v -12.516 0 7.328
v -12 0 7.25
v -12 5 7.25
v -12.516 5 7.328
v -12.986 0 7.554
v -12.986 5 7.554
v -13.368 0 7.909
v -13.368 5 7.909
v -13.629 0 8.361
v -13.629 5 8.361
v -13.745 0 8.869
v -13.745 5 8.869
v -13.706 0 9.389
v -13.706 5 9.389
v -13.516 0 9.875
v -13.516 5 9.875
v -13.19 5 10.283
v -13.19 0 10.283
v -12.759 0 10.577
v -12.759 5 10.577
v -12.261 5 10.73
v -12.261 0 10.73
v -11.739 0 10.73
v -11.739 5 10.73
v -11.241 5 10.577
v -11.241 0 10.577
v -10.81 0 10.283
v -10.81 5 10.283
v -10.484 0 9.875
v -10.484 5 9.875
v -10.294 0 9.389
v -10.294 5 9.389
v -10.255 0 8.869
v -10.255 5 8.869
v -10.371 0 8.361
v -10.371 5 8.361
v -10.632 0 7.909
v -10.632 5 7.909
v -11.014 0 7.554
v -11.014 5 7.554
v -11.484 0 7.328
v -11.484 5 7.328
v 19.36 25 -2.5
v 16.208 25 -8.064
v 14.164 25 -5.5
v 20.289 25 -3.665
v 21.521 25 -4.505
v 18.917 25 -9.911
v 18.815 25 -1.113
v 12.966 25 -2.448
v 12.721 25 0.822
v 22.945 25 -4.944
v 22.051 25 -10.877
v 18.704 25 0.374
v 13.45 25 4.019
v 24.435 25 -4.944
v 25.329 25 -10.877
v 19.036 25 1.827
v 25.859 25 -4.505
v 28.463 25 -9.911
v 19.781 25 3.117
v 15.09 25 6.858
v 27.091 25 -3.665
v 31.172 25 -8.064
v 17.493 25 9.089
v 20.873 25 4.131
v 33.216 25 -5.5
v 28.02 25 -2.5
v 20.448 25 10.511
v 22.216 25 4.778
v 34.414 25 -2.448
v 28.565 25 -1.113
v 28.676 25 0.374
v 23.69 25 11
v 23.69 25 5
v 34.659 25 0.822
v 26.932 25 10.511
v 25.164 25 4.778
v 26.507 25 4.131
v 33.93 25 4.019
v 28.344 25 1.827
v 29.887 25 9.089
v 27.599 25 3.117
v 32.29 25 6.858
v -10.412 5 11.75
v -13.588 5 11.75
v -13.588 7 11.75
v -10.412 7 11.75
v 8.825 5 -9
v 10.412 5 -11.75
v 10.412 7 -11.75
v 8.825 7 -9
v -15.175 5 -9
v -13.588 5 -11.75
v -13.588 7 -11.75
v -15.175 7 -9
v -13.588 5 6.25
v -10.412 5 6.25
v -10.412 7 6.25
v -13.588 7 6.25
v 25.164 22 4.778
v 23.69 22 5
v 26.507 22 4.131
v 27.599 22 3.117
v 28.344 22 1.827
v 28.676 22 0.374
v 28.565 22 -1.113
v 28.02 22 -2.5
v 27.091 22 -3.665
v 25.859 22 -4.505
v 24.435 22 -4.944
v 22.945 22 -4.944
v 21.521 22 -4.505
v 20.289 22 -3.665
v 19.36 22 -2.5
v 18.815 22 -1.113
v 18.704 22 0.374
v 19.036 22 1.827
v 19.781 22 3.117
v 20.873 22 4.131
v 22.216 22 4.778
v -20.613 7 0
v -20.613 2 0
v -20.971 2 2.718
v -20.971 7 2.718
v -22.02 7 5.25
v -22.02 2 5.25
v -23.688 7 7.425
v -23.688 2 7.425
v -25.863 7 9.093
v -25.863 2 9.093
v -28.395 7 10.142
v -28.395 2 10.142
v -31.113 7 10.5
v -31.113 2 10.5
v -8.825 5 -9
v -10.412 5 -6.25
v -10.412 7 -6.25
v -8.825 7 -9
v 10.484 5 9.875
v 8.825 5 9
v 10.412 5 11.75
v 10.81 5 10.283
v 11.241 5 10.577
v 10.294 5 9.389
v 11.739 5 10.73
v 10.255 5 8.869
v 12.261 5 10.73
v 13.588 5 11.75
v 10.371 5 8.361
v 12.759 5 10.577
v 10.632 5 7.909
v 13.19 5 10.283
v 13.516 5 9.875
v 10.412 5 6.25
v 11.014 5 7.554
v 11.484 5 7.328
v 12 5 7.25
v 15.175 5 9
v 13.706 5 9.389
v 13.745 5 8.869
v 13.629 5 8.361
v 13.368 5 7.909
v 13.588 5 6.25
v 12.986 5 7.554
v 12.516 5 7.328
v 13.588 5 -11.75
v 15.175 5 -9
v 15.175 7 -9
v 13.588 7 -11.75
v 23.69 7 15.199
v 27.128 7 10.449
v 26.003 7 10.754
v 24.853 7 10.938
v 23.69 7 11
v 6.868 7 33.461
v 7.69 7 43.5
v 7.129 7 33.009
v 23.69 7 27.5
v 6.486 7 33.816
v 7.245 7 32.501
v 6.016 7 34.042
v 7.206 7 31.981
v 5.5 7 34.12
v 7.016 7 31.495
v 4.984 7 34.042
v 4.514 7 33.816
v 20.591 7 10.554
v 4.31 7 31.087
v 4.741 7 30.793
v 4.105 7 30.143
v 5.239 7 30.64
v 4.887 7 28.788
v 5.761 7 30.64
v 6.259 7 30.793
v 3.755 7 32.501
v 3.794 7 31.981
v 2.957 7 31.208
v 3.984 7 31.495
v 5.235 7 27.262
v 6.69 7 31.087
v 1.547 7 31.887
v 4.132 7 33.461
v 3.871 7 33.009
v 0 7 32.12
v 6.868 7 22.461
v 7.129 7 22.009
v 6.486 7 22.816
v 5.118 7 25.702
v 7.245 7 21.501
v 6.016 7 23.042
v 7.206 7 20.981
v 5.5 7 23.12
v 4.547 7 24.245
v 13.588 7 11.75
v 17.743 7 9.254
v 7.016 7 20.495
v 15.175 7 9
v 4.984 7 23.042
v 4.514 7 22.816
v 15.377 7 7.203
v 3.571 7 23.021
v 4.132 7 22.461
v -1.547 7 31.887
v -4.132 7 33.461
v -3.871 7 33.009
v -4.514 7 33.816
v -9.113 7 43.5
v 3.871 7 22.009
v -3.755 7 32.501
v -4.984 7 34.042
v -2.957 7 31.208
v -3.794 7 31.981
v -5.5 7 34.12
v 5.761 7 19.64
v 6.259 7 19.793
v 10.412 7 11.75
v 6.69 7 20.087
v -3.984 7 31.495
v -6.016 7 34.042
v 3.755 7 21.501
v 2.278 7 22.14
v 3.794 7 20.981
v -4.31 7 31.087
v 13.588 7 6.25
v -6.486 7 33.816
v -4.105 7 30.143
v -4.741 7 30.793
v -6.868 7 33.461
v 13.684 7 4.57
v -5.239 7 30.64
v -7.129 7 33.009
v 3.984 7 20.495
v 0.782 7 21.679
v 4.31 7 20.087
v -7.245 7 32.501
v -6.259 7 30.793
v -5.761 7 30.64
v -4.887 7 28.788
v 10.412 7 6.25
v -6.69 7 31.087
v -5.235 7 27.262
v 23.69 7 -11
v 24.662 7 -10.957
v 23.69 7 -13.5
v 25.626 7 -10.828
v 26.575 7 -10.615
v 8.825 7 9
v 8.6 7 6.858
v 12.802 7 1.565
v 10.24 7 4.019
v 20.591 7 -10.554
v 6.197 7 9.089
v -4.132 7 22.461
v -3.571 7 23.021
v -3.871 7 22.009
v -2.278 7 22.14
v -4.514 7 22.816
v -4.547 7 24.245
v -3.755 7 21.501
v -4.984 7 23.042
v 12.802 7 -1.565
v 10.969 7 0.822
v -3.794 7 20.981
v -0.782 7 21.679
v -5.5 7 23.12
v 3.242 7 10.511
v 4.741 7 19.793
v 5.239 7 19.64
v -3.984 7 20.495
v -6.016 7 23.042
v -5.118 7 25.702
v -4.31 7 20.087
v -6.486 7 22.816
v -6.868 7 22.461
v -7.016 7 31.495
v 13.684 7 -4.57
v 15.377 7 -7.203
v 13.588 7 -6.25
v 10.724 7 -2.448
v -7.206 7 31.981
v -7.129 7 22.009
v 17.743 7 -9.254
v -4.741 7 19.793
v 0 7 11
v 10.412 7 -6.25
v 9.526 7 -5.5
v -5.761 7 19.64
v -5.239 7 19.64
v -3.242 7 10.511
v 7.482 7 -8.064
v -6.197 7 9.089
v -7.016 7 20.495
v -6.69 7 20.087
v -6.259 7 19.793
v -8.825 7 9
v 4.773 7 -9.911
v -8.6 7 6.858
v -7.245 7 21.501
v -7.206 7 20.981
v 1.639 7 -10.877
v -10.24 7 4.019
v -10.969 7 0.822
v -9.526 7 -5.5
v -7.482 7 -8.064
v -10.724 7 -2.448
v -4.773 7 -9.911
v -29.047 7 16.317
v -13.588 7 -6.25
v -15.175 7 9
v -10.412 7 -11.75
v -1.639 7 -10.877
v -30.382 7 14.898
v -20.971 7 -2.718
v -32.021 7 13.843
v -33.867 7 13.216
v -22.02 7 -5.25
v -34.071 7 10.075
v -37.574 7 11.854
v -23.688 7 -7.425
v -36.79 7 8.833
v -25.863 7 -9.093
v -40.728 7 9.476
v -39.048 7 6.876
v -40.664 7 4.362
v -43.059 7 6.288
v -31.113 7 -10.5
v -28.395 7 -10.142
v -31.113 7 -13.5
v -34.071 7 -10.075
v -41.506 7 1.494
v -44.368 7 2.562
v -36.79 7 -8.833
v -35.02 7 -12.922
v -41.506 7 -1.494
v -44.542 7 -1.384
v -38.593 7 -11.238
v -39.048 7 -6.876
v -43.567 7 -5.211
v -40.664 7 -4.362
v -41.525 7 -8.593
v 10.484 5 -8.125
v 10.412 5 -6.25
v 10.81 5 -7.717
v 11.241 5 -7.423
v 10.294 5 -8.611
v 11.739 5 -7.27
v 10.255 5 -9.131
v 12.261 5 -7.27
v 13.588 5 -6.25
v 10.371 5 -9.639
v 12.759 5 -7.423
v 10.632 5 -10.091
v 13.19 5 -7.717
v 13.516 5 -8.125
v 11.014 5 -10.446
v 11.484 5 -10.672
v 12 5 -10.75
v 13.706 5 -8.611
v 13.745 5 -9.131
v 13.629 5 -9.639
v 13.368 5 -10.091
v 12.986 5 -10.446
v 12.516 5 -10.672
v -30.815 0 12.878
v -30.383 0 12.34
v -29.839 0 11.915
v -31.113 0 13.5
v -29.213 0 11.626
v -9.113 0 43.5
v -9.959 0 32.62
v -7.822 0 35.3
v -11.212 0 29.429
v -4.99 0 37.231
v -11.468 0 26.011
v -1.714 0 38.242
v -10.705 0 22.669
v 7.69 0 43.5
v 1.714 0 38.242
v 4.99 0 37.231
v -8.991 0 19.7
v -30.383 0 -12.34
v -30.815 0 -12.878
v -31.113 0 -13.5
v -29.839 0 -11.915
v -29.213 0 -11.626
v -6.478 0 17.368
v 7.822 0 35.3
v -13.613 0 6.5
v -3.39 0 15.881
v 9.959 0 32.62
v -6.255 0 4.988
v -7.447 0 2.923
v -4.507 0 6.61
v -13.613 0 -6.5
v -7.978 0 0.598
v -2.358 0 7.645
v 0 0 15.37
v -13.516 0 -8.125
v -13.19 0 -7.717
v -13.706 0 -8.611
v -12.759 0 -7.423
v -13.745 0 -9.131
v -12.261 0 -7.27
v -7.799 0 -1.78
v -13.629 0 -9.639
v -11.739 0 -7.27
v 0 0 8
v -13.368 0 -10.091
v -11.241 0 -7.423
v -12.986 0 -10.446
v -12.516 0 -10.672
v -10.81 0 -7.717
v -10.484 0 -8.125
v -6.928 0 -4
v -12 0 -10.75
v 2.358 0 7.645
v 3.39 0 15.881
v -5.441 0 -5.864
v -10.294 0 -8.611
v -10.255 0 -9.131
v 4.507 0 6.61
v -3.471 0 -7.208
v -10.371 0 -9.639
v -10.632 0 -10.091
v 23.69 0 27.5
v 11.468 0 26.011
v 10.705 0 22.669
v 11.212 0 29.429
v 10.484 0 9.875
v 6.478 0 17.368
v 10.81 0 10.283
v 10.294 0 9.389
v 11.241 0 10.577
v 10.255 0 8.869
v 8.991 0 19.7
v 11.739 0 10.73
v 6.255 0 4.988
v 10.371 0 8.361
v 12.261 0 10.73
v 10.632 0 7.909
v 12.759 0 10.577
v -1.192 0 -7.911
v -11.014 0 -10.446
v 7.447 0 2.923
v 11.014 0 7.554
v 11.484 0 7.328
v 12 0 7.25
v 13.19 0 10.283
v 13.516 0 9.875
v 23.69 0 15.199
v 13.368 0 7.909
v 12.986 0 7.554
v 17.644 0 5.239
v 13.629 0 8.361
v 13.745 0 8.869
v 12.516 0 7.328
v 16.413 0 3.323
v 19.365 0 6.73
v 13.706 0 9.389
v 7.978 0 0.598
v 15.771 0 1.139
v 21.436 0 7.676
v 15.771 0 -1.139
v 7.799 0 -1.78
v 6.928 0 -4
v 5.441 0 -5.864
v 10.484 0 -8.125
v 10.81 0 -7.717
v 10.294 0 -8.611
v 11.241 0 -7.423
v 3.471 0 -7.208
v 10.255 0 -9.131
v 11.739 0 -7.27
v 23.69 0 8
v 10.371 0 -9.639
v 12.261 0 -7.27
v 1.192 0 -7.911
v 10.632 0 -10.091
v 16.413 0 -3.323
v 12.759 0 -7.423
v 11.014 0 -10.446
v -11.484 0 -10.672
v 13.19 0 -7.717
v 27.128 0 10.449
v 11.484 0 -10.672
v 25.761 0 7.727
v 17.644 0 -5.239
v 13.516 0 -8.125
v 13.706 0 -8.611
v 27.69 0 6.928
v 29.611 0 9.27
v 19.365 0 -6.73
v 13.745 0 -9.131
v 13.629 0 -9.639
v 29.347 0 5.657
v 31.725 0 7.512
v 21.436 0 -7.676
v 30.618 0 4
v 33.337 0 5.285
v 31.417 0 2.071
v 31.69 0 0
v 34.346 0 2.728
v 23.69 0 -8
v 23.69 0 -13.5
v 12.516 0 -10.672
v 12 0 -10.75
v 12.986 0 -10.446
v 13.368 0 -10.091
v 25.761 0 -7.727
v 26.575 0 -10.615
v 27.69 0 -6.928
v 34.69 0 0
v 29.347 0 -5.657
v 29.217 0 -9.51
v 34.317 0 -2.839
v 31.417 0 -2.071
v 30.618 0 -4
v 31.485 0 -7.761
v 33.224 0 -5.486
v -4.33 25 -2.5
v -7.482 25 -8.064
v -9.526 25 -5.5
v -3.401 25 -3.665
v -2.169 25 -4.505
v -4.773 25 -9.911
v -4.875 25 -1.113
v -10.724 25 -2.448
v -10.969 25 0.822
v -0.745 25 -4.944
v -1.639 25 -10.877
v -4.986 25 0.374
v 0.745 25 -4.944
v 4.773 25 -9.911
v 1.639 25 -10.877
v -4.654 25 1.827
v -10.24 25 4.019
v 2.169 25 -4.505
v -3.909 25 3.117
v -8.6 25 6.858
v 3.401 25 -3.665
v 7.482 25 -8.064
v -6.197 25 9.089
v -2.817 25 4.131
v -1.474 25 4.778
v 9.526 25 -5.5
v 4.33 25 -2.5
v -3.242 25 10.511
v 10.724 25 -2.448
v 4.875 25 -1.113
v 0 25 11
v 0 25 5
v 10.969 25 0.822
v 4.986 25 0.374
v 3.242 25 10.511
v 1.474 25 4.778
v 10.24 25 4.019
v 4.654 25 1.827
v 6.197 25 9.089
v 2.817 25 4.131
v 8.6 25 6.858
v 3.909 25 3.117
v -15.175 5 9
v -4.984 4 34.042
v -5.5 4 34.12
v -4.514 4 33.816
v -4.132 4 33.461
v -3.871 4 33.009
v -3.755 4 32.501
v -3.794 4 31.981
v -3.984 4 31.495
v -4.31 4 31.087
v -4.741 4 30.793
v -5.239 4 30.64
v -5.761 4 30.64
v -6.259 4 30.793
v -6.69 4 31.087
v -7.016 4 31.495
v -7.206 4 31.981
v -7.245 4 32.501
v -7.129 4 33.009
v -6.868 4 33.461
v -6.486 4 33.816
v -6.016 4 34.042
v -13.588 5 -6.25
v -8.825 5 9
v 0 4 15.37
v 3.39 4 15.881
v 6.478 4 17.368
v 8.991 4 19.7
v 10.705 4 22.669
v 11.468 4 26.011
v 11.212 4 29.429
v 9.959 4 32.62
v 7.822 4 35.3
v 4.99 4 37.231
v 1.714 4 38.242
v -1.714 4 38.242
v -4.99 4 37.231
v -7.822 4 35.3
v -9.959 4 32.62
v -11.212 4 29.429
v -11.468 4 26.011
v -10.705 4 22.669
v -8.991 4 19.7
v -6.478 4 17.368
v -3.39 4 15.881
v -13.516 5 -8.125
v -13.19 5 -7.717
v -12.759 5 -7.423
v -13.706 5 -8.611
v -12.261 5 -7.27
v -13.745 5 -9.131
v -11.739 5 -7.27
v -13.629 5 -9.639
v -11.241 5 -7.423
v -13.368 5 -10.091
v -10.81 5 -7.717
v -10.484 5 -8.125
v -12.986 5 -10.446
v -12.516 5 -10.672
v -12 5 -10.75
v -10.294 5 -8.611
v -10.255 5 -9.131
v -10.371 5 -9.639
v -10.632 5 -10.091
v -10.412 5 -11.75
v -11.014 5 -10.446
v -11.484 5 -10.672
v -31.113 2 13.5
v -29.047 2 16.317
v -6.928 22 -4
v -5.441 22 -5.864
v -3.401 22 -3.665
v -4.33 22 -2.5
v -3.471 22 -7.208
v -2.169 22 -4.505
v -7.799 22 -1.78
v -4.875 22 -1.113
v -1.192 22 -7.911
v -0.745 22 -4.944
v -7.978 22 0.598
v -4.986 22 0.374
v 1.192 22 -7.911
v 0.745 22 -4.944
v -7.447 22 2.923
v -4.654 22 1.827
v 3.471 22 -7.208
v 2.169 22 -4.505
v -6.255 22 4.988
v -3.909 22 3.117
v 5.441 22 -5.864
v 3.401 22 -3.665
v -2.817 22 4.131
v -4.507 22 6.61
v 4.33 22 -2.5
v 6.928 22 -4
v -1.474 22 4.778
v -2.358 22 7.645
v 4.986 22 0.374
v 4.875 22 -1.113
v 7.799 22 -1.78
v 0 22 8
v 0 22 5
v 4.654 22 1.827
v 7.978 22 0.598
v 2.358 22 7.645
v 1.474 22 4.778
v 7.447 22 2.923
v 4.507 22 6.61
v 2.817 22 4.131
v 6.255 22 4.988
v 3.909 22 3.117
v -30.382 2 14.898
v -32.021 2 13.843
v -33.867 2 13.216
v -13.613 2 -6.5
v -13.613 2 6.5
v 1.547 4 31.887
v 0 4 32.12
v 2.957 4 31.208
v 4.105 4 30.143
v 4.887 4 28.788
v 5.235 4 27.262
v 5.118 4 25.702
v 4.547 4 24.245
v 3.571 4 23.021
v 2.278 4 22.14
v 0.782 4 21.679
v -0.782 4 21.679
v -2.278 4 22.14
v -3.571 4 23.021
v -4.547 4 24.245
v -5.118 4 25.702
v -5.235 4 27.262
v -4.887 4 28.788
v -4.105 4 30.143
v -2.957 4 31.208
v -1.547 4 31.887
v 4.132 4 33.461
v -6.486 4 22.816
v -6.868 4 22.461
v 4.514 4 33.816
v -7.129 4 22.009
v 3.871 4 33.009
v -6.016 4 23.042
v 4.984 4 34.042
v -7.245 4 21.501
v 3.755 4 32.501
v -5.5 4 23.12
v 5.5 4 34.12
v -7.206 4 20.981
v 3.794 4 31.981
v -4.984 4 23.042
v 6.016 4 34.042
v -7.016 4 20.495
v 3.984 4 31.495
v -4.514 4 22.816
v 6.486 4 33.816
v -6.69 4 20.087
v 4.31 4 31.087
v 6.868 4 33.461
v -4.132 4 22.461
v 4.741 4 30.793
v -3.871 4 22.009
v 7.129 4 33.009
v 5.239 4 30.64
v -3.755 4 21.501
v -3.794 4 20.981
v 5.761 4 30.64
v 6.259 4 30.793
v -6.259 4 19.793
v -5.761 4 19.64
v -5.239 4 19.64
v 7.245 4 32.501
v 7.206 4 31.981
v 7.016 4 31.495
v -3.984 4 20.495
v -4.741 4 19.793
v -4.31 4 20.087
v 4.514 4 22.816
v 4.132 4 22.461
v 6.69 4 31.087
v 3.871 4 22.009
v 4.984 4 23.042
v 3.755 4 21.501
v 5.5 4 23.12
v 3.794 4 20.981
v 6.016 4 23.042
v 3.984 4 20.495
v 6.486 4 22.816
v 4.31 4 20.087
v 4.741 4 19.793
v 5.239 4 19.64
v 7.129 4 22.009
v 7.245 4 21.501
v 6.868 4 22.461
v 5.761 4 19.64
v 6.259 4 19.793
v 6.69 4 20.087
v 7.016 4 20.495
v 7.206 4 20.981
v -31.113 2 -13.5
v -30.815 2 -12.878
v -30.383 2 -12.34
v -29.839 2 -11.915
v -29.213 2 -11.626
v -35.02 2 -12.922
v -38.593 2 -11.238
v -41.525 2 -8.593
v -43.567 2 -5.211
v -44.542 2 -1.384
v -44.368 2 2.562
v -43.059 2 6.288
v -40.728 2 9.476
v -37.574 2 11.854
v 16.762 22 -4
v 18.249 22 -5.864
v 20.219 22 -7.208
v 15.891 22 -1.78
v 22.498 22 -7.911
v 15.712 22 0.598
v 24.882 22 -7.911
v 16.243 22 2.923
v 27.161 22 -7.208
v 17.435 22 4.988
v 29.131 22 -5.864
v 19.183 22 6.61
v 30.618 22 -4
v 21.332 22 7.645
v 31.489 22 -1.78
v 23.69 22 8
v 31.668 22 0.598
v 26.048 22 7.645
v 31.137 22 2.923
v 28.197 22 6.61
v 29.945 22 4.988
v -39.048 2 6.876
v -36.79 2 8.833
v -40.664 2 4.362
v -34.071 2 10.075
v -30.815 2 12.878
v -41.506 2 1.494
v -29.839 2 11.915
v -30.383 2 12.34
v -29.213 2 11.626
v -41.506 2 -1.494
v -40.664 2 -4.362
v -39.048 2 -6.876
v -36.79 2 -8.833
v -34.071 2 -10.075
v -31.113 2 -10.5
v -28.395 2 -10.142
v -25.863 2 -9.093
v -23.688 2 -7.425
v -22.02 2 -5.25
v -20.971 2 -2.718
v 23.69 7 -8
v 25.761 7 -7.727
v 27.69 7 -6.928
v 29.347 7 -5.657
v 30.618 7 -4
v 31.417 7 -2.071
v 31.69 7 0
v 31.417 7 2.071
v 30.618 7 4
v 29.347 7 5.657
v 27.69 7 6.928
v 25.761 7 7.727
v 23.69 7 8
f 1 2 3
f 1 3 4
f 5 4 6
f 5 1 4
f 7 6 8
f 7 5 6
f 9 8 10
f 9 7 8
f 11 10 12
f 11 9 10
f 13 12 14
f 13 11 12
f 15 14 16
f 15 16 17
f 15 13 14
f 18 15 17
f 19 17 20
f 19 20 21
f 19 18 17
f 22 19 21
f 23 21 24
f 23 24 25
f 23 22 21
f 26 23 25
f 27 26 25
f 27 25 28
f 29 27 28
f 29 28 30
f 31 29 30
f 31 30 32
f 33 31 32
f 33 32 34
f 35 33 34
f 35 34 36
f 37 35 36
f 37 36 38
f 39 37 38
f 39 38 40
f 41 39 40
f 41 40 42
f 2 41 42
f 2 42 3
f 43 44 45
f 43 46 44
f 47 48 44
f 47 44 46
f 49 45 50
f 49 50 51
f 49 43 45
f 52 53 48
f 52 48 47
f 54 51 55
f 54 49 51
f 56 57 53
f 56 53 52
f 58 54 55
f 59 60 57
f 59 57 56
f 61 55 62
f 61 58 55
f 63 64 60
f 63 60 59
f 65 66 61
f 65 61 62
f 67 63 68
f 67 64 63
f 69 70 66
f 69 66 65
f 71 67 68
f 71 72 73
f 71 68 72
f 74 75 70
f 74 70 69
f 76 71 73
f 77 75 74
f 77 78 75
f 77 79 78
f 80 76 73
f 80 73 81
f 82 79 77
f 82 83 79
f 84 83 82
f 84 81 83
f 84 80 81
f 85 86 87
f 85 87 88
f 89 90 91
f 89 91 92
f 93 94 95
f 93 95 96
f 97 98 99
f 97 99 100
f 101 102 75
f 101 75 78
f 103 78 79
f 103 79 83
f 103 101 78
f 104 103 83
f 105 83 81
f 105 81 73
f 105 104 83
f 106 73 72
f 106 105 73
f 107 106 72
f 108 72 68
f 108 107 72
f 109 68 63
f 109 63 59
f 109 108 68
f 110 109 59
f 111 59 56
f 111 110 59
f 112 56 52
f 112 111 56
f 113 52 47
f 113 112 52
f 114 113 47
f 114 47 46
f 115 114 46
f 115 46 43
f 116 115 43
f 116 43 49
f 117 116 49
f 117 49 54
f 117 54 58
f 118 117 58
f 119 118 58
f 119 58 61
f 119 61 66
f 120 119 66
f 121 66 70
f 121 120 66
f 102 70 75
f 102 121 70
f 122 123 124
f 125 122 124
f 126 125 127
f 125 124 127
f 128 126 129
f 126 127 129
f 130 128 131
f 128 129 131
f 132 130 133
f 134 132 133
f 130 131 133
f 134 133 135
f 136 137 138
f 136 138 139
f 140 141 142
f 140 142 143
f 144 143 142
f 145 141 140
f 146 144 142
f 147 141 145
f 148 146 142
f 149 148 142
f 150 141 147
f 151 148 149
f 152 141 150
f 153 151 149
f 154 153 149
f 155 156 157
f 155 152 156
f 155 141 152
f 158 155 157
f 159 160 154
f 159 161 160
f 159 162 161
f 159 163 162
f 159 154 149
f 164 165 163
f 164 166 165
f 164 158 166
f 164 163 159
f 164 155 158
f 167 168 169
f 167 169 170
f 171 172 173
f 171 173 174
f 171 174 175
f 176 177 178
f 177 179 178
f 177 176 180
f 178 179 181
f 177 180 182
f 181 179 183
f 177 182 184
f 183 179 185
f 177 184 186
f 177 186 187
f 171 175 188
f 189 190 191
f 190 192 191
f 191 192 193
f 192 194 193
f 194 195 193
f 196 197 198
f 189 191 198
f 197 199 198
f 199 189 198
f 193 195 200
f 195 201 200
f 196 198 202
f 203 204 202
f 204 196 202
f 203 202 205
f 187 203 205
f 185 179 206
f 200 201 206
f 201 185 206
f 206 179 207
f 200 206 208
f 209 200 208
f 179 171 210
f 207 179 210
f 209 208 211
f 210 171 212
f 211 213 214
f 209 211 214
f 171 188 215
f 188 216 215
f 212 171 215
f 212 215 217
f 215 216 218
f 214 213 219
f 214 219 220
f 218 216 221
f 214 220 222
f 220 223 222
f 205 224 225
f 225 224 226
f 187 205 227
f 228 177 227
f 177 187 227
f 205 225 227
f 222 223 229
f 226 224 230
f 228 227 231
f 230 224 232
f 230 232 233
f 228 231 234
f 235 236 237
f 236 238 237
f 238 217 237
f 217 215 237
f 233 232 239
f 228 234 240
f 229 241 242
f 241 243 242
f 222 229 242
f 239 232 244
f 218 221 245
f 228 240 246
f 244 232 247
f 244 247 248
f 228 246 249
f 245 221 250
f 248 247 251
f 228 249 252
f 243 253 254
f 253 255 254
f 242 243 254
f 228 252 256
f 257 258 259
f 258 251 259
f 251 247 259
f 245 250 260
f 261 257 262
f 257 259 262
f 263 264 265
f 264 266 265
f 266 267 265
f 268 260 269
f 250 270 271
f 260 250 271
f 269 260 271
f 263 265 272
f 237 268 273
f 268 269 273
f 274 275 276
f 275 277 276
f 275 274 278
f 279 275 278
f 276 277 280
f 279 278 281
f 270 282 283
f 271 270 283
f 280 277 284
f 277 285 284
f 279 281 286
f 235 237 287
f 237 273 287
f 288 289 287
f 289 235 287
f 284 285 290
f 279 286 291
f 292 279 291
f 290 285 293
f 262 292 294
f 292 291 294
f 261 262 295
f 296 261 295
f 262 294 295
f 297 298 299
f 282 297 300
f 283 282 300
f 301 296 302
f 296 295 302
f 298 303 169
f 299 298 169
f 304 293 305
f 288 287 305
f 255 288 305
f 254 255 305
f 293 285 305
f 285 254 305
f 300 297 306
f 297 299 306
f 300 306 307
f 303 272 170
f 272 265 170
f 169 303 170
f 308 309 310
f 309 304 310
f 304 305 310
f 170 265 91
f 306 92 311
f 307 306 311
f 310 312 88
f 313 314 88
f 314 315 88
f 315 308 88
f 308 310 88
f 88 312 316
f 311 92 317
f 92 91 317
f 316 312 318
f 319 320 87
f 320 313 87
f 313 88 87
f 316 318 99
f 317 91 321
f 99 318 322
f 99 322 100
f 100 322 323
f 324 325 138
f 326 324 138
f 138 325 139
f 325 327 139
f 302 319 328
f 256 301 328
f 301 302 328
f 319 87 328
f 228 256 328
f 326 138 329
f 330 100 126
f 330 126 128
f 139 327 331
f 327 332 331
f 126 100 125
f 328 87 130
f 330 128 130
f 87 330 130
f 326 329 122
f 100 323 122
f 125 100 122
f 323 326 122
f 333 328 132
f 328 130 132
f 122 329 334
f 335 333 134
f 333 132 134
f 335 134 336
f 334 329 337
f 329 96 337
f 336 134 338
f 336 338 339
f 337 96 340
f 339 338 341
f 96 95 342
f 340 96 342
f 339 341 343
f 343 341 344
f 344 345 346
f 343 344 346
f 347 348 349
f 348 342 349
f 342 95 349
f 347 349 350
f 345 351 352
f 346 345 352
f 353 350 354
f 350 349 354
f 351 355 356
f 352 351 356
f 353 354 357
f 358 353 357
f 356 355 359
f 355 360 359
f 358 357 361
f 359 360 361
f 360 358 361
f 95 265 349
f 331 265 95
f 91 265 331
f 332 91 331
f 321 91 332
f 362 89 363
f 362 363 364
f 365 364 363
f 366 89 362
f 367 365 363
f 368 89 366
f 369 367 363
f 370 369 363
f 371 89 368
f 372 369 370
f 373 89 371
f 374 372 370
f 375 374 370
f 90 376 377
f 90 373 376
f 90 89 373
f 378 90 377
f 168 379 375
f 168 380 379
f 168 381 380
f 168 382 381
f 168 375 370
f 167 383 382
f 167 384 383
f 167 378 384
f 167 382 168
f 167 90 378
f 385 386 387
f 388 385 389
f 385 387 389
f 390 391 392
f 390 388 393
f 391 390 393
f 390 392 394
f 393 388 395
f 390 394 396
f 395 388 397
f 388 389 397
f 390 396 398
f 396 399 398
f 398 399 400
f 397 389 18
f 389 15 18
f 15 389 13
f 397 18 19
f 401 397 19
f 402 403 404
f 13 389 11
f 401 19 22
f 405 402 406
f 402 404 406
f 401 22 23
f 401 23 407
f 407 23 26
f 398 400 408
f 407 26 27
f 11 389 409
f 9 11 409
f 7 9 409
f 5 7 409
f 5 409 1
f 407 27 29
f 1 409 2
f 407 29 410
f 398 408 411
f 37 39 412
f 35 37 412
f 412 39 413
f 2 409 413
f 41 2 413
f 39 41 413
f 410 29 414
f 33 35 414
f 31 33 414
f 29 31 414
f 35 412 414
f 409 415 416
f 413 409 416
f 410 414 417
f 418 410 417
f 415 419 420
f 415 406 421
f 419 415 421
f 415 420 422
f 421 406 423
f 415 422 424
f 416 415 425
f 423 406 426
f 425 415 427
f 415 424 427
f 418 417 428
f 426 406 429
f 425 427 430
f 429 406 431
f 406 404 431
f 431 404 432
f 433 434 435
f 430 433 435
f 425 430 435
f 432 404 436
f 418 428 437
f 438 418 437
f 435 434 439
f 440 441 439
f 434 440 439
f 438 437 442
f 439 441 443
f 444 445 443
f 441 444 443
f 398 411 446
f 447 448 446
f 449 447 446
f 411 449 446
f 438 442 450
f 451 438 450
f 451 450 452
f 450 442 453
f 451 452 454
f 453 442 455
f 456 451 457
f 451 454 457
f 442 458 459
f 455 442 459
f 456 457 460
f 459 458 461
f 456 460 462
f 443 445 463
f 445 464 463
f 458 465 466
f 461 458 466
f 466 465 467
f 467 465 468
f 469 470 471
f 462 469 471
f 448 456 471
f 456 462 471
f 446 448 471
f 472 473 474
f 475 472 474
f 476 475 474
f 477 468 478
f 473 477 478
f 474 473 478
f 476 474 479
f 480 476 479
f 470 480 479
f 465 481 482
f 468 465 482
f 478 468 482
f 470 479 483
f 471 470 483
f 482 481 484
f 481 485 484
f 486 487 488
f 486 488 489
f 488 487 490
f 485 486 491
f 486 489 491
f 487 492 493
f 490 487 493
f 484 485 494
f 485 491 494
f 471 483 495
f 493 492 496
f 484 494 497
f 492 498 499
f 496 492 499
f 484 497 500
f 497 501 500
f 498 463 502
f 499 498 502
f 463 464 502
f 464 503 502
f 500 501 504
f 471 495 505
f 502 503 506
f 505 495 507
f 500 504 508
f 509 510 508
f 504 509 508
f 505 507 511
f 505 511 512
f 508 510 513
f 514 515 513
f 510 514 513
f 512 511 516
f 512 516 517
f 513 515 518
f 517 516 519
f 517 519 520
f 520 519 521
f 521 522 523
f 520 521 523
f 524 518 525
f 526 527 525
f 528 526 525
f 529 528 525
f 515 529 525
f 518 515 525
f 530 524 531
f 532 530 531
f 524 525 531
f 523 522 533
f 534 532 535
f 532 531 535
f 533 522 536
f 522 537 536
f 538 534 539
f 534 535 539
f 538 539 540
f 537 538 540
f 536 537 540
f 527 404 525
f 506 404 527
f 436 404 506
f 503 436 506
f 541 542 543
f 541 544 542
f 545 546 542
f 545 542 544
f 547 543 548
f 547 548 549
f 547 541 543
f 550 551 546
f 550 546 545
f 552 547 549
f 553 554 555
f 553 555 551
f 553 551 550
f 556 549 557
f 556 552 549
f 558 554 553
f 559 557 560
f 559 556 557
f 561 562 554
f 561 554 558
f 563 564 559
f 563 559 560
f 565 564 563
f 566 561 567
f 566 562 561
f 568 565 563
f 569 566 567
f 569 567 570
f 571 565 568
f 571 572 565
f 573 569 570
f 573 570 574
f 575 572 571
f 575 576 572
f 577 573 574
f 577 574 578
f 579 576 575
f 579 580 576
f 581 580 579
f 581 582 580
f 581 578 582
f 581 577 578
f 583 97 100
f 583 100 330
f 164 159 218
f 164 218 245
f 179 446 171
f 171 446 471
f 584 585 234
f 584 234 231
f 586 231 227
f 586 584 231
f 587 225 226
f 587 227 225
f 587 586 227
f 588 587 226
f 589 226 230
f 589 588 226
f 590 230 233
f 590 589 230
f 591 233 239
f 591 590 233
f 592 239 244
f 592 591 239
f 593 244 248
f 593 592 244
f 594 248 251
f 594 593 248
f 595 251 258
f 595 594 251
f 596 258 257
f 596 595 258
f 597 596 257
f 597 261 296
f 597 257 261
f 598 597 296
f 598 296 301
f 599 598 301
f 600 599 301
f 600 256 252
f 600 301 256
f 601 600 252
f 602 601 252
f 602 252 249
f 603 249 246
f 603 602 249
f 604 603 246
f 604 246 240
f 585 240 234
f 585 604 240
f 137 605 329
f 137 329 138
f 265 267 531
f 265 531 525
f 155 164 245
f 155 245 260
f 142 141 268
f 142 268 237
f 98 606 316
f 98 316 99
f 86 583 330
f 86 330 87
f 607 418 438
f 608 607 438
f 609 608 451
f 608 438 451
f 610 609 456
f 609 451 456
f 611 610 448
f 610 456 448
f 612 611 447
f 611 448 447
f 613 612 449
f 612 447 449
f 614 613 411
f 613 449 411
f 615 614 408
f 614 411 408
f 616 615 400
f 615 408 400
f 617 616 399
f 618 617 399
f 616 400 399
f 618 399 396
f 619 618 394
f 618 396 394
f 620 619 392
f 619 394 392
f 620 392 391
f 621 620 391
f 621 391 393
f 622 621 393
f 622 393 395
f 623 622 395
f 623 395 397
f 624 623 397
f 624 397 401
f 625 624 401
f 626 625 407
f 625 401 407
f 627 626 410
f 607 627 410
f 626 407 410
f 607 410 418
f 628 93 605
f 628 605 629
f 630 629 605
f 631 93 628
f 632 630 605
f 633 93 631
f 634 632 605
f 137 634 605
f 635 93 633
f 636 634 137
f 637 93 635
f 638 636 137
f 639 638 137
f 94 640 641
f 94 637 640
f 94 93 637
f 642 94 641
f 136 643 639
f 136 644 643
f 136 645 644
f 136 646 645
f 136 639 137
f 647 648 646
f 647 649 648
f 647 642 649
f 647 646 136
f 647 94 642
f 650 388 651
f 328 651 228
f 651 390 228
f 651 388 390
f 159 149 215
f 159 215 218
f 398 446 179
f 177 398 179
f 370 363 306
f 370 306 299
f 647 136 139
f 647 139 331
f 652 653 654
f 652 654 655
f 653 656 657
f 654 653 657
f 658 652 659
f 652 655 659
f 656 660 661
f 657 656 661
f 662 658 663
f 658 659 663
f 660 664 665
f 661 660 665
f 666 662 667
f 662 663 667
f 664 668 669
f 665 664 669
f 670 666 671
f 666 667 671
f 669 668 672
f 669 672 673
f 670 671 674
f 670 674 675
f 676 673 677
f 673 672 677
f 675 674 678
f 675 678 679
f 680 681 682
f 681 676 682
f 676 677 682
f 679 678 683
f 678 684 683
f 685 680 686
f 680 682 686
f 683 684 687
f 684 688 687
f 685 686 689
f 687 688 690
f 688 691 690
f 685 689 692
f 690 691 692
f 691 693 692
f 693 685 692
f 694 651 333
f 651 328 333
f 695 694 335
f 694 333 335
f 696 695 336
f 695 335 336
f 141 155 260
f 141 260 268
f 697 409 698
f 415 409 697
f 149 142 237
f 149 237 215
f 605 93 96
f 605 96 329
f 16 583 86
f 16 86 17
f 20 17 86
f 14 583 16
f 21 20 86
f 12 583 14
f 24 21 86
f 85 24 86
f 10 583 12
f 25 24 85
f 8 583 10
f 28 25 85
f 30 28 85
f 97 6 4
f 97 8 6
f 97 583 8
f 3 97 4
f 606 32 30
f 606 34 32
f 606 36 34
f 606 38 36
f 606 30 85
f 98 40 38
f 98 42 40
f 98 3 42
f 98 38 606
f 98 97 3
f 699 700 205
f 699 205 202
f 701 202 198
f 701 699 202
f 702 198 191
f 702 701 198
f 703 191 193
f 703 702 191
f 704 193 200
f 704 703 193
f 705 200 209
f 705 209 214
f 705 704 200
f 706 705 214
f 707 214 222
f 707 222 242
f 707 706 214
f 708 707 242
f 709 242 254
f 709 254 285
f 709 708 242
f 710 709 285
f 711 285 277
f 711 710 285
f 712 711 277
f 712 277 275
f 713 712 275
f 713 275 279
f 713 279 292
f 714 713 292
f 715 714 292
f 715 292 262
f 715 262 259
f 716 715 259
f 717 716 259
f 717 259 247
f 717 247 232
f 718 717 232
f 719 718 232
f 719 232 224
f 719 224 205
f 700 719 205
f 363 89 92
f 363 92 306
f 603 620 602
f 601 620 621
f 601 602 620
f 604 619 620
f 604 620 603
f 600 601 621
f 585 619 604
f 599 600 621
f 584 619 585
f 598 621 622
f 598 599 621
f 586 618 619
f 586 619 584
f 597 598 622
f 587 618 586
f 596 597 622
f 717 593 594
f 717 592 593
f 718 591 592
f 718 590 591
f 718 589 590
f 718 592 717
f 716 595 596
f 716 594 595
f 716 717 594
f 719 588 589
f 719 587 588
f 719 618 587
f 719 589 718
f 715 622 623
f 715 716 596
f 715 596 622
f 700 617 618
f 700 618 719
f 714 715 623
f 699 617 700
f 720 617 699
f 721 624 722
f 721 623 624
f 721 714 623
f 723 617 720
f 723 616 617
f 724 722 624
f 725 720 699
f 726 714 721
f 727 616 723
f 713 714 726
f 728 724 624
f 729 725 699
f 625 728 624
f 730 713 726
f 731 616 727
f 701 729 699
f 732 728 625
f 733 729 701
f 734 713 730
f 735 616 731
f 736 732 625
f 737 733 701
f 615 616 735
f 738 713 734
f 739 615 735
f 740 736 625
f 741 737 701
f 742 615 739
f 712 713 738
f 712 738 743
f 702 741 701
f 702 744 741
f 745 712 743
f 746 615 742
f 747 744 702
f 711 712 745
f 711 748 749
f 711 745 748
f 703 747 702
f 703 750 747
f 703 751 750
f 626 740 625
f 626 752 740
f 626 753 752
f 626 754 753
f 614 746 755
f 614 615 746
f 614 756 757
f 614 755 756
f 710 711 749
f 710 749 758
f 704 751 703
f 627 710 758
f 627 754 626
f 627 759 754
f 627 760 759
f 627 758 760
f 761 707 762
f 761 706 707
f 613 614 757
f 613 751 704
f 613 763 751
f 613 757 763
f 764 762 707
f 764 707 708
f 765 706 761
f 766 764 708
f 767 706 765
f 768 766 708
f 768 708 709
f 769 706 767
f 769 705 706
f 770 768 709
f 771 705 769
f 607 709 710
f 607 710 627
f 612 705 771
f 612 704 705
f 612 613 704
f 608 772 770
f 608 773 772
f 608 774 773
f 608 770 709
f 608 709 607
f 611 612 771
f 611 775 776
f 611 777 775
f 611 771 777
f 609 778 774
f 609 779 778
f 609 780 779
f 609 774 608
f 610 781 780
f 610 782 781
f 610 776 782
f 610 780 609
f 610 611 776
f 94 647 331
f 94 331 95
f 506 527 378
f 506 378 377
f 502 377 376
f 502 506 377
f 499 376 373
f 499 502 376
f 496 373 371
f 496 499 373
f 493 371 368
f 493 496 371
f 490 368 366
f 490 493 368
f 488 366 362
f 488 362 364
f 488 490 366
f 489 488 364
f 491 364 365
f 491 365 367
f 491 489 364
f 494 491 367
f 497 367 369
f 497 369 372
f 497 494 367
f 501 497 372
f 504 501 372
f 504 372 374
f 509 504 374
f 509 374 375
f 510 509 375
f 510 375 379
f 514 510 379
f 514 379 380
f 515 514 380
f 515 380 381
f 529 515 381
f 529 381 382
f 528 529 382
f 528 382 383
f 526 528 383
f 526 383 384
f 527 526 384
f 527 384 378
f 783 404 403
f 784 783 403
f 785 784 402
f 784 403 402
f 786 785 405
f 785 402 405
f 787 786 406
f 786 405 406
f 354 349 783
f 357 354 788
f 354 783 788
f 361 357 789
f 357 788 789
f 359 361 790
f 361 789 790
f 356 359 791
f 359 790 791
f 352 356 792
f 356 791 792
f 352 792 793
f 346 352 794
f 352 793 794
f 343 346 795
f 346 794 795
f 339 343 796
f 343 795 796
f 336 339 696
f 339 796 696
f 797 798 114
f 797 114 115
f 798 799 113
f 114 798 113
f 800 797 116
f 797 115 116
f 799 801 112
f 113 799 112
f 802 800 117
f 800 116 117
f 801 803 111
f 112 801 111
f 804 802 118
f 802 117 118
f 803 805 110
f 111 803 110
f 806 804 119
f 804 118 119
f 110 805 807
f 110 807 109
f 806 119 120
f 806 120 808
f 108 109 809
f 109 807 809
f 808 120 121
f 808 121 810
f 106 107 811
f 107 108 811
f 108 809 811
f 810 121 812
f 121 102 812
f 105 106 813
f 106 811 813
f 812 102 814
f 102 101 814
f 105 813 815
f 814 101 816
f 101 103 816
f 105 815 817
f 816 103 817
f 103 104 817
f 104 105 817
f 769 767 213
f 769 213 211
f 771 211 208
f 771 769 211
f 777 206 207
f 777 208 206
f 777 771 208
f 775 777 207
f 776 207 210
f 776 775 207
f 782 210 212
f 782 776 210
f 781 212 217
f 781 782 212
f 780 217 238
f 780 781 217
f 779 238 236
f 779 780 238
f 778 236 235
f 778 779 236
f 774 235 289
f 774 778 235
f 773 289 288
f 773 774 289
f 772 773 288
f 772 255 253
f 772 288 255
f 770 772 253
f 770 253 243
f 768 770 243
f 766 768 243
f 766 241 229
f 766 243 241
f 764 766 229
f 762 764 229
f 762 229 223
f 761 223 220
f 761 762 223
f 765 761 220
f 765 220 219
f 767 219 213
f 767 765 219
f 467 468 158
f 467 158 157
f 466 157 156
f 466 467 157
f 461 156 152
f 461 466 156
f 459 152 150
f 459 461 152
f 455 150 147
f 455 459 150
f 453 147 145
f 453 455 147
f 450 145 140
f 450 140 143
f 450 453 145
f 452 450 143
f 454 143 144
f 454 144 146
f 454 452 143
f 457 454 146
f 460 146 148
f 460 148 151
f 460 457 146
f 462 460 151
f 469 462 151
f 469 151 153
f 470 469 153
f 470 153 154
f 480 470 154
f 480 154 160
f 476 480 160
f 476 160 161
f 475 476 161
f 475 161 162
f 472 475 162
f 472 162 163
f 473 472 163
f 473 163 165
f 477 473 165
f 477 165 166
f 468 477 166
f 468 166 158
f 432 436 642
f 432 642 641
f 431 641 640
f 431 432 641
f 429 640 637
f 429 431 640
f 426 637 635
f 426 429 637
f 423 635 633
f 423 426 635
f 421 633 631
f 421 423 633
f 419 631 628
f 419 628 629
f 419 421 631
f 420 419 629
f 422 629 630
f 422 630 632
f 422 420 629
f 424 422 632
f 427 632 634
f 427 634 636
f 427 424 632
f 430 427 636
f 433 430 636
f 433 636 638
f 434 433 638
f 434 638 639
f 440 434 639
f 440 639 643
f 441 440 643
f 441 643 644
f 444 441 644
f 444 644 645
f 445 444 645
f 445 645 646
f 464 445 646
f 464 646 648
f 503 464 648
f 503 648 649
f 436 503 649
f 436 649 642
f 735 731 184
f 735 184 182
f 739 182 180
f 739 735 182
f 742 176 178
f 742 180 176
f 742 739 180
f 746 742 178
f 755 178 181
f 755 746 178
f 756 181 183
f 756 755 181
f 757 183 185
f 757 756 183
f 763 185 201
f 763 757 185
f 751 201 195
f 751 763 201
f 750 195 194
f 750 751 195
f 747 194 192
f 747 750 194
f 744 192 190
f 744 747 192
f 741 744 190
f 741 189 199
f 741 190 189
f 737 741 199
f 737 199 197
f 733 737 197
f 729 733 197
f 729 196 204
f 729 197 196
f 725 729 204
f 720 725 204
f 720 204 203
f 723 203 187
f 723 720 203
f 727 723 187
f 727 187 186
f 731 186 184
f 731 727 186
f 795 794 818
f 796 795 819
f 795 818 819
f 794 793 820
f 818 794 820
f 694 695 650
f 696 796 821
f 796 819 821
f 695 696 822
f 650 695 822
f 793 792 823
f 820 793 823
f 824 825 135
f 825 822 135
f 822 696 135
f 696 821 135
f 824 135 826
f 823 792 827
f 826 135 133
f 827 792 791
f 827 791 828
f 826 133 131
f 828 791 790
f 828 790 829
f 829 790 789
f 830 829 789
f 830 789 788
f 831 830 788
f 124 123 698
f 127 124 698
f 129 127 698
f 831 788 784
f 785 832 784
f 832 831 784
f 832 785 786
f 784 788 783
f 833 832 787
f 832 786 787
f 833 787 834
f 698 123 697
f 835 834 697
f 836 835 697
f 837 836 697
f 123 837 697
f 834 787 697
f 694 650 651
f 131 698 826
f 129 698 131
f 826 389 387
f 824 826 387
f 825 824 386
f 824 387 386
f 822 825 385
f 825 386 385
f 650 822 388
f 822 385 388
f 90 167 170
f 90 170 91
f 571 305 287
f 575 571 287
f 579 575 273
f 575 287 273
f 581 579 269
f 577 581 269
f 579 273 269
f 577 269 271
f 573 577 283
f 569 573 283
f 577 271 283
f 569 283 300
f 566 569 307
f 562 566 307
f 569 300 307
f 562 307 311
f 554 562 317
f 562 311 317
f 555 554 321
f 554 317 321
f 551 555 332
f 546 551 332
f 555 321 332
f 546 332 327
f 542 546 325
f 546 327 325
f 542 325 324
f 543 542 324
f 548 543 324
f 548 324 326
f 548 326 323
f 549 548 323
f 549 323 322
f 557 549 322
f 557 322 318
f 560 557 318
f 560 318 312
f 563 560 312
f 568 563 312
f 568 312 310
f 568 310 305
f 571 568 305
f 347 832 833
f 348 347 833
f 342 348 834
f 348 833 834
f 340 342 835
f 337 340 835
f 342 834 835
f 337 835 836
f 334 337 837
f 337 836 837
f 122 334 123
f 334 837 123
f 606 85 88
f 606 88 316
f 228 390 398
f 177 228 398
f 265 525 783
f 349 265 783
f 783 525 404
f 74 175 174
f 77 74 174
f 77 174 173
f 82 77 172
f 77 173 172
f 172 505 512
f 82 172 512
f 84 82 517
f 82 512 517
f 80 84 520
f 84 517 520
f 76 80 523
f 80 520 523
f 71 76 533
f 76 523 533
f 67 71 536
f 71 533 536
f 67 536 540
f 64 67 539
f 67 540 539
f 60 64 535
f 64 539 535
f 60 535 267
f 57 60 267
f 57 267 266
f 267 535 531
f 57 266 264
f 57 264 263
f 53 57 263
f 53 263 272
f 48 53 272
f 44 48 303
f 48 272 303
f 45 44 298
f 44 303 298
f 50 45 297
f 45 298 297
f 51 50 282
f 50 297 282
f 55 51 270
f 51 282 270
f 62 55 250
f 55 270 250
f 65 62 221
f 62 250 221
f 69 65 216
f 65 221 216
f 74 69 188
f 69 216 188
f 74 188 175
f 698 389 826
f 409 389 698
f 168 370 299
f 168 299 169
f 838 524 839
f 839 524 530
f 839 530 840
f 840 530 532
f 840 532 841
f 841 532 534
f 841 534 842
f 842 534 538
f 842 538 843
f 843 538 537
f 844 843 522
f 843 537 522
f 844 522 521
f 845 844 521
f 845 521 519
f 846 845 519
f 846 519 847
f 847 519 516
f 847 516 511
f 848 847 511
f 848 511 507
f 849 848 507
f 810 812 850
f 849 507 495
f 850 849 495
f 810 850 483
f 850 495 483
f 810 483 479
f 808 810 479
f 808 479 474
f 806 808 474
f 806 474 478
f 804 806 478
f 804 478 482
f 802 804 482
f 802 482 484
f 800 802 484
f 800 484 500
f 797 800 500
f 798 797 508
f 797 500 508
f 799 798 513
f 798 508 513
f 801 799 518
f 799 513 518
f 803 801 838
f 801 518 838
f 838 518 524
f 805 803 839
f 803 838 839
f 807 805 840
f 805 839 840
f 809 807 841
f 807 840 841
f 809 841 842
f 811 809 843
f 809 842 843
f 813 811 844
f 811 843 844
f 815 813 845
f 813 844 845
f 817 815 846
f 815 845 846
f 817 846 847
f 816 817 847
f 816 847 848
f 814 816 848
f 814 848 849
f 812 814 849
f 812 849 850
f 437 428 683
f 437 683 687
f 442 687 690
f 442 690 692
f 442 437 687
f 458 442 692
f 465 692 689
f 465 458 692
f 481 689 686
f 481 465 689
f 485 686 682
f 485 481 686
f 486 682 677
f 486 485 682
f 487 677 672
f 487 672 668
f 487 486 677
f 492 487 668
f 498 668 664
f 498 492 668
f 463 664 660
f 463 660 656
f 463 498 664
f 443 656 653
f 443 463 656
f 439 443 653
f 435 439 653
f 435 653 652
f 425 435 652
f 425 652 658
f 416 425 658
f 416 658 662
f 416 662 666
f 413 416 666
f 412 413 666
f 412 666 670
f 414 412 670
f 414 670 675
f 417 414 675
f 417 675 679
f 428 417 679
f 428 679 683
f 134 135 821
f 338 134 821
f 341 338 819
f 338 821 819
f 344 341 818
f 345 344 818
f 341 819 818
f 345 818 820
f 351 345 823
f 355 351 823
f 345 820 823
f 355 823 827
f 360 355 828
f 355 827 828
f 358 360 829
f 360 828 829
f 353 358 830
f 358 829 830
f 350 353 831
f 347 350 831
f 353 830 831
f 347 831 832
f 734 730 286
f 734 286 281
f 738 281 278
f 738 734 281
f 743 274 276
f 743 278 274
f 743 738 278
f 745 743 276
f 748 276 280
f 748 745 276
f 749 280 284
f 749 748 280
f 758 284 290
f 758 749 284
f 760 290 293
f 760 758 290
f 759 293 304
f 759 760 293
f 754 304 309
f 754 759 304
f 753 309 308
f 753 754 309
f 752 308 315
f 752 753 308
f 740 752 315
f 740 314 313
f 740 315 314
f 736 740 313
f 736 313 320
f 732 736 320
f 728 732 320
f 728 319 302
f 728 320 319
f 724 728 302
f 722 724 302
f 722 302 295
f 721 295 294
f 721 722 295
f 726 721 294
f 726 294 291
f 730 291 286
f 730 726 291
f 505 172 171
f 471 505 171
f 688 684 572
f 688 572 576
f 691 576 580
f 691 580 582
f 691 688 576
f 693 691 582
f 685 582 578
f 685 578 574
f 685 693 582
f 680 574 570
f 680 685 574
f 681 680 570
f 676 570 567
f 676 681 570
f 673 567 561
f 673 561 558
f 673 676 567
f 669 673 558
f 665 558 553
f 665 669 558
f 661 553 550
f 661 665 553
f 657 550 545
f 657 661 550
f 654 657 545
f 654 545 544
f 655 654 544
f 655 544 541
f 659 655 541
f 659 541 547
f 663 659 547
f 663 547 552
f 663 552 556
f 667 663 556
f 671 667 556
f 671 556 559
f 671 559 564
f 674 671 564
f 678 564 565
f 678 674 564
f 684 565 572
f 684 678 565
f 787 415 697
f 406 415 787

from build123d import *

# Parameters (mm, degrees)
SKETCH3_R               = 8
SKETCH3_W               = 54.803
SKETCH3_H               = 30
SKETCH3_R_2             = 5.25
BOSS_EXTRUDE1_DEPTH     = 7
CUT_EXTRUDE3_DEPTH      = 63.702230973
CUT_EXTRUDE3_DEPTH_BACK = 63.702230973
SKETCH4_R               = 1.75
SKETCH6_R               = 11
SKETCH6_R_2             = 8
BOSS_EXTRUDE2_DEPTH     = 15
SKETCH7_R               = 11
SKETCH7_R_2             = 5
BOSS_EXTRUDE3_DEPTH     = 3
CHAMFER1_SIZE           = 2.5
CUT_EXTRUDE4_DEPTH      = 2
CUT_EXTRUDE5_DEPTH      = 68.138437344
CUT_EXTRUDE5_DEPTH_BACK = 68.138437344
SKETCH9_R               = 1.75
CUT_EXTRUDE6_START      = -2
SKETCH10_R              = 1.75
CUT_EXTRUDE6_DEPTH      = 2
CHAMFER3_SIZE           = 30
CHAMFER3_SIZE2          = 22
CHAMFER4_SIZE           = 16
FILLET1_R               = 8
SKETCH14_R              = 11.5
SKETCH14_R_2            = 5.25
SKETCH14_R_3            = 1.75
CUT_EXTRUDE8_DEPTH      = 4
FILLET2_R               = 3


with BuildPart() as part:
    # Sketch3 → Boss-Extrude1 (new body)
    # profile 1 of 10: a face of its own
    with BuildSketch(Plane(origin=(0, 0, 0), x_dir=(1, 0, 0), z_dir=(0, 1, 0))):
        with BuildLine():
            ThreePointArc((-17.613, 0), (-21.567058454, 9.545941546), (-31.113, 13.5))
            Line((-31.113, 13.5), (-31.113, 10.5))
            ThreePointArc((-31.113, 10.5), (-23.688378798, 7.424621202), (-20.613, 0))
            ThreePointArc((-20.613, 0), (-23.688378798, -7.424621202), (-31.113, -10.5))
            Line((-31.113, -10.5), (-31.113, -13.5))
            ThreePointArc((-31.113, -13.5), (-21.567058454, -9.545941546), (-17.613, 0))
        make_face()
    # profile 2 of 10: a face of its own
    with BuildSketch(Plane(origin=(0, 0, 0), x_dir=(1, 0, 0), z_dir=(0, 1, 0))):
        with BuildLine():
            Line((-31.113, 10.5), (-31.113, 13.5))
            ThreePointArc((-31.113, 13.5), (-44.613, 0), (-31.113, -13.5))
            Line((-31.113, -13.5), (-31.113, -10.5))
            ThreePointArc((-31.113, -10.5), (-41.613, 0), (-31.113, 10.5))
        make_face()
    # profile 3 of 10: a face of its own
    with BuildSketch(Plane(origin=(0, 0, 0), x_dir=(1, 0, 0), z_dir=(0, 1, 0))):
        with BuildLine():
            Line((23.69, 13.5), (-31.113, 13.5))
            ThreePointArc((-31.113, 13.5), (-21.567058454, 9.545941546), (-17.613, 0))
            ThreePointArc((-17.613, 0), (-21.567058454, -9.545941546), (-31.113, -13.5))
            Line((-31.113, -13.5), (23.69, -13.5))
            Line((23.69, -13.5), (23.69, -11))
            ThreePointArc((23.69, -11), (12.69, 0), (23.69, 11))
            Line((23.69, 11), (23.69, 13.5))
        make_face()
        with Locations(Location((0, 0, 0), (0, 0, 270))):
            Circle(SKETCH3_R, mode=Mode.SUBTRACT)
    # profile 4 of 10: a face of its own
    with BuildSketch(Plane(origin=(0, 0, 0), x_dir=(1, 0, 0), z_dir=(0, 1, 0))):
        with BuildLine():
            ThreePointArc((-17.613, 0), (-21.567058454, 9.545941546), (-31.113, 13.5))
            Line((-31.113, 13.5), (-31.113, 10.5))
            ThreePointArc((-31.113, 10.5), (-23.688378798, 7.424621202), (-20.613, 0))
            ThreePointArc((-20.613, 0), (-23.688378798, -7.424621202), (-31.113, -10.5))
            Line((-31.113, -10.5), (-31.113, -13.5))
            ThreePointArc((-31.113, -13.5), (-21.567058454, -9.545941546), (-17.613, 0))
        make_face()
    # profile 5 of 10: a face of its own
    with BuildSketch(Plane(origin=(0, 0, 0), x_dir=(1, 0, 0), z_dir=(0, 1, 0))):
        with BuildLine():
            Line((-31.113, 10.5), (-31.113, 13.5))
            ThreePointArc((-31.113, 13.5), (-44.613, 0), (-31.113, -13.5))
            Line((-31.113, -13.5), (-31.113, -10.5))
            ThreePointArc((-31.113, -10.5), (-41.613, 0), (-31.113, 10.5))
        make_face()
    # profile 6 of 10: a face of its own
    with BuildSketch(Plane(origin=(0, 0, 0), x_dir=(1, 0, 0), z_dir=(0, 1, 0))):
        with BuildLine():
            ThreePointArc((34.69, 0), (31.468174593, 7.778174593), (23.69, 11))
            Line((23.69, 11), (23.69, 8))
            ThreePointArc((23.69, 8), (29.346854249, 5.656854249), (31.69, 0))
            ThreePointArc((31.69, 0), (29.346854249, -5.656854249), (23.69, -8))
            Line((23.69, -8), (23.69, -11))
            ThreePointArc((23.69, -11), (31.468174593, -7.778174593), (34.69, 0))
        make_face()
    # profile 7 of 10: a face of its own
    with BuildSketch(Plane(origin=(0, 0, 0), x_dir=(1, 0, 0), z_dir=(0, 1, 0))):
        with BuildLine():
            Line((23.69, 8), (23.69, 11))
            ThreePointArc((23.69, 11), (12.69, 0), (23.69, -11))
            Line((23.69, -11), (23.69, -8))
            ThreePointArc((23.69, -8), (15.69, 0), (23.69, 8))
        make_face()
    # profile 8 of 10: a face of its own
    with BuildSketch(Plane(origin=(0, 0, 0), x_dir=(1, 0, 0), z_dir=(0, 1, 0))):
        with Locations((-3.7115, -28.5)):
            Rectangle(SKETCH3_W, SKETCH3_H)
        with Locations(Location((0, -26.87, 0), (0, 0, 270))):
            Circle(SKETCH3_R_2, mode=Mode.SUBTRACT)
    # profile 9 of 10: a face of its own
    with BuildSketch(Plane(origin=(0, 0, 0), x_dir=(1, 0, 0), z_dir=(0, 1, 0))):
        with BuildLine():
            ThreePointArc((34.69, 0), (31.468174593, 7.778174593), (23.69, 11))
            Line((23.69, 11), (23.69, 8))
            ThreePointArc((23.69, 8), (29.346854249, 5.656854249), (31.69, 0))
            ThreePointArc((31.69, 0), (29.346854249, -5.656854249), (23.69, -8))
            Line((23.69, -8), (23.69, -11))
            ThreePointArc((23.69, -11), (31.468174593, -7.778174593), (34.69, 0))
        make_face()
    # profile 10 of 10: a face of its own
    with BuildSketch(Plane(origin=(0, 0, 0), x_dir=(1, 0, 0), z_dir=(0, 1, 0))):
        with BuildLine():
            Line((23.69, 8), (23.69, 11))
            ThreePointArc((23.69, 11), (12.69, 0), (23.69, -11))
            Line((23.69, -11), (23.69, -8))
            ThreePointArc((23.69, -8), (15.69, 0), (23.69, 8))
        make_face()
    extrude(amount=BOSS_EXTRUDE1_DEPTH)

    # Sketch4 → Cut-Extrude3 (cut, two sides: drawn at the far end of the back side and taken through both)
    with BuildSketch(Plane(origin=(0, 0, 0), x_dir=(1, 0, 0), z_dir=(0, 1, 0)).offset(-CUT_EXTRUDE3_DEPTH_BACK)):
        with Locations(Location((5.5, -21.37, 0), (0, 0, 270))):
            Circle(SKETCH4_R)
        with Locations(Location((5.5, -32.37, 0), (0, 0, 270))):
            Circle(SKETCH4_R)
        with Locations(Location((-5.5, -32.37, 0), (0, 0, 270))):
            Circle(SKETCH4_R)
        with Locations(Location((-5.5, -21.37, 0), (0, 0, 270))):
            Circle(SKETCH4_R)
    extrude(amount=CUT_EXTRUDE3_DEPTH + CUT_EXTRUDE3_DEPTH_BACK, mode=Mode.SUBTRACT)

    # Sketch6 → Boss-Extrude2 (add)
    # profile 1 of 2: a face of its own
    with BuildSketch(Plane(origin=(0, 7, 0), x_dir=(1, 0, 0), z_dir=(0, 1, 0))):
        with Locations(Location((23.69, 0, 0), (0, 0, 270))):
            Circle(SKETCH6_R)
        with Locations(Location((23.69, 0, 0), (0, 0, 270))):
            Circle(SKETCH6_R_2, mode=Mode.SUBTRACT)
    # profile 2 of 2: a face of its own
    with BuildSketch(Plane(origin=(0, 7, 0), x_dir=(1, 0, 0), z_dir=(0, 1, 0))):
        with Locations(Location((0, 0, 0), (0, 0, 270))):
            Circle(SKETCH6_R)
        with Locations(Location((0, 0, 0), (0, 0, 270))):
            Circle(SKETCH6_R_2, mode=Mode.SUBTRACT)
    extrude(amount=BOSS_EXTRUDE2_DEPTH)

    # Sketch7 → Boss-Extrude3 (add)
    # profile 1 of 2: a face of its own
    with BuildSketch(Plane(origin=(0, 22, 0), x_dir=(1, 0, 0), z_dir=(0, 1, 0))):
        with Locations(Location((23.69, 0, 0), (0, 0, 270))):
            Circle(SKETCH7_R)
        with Locations(Location((23.69, 0, 0), (0, 0, 270))):
            Circle(SKETCH7_R_2, mode=Mode.SUBTRACT)
    # profile 2 of 2: a face of its own
    with BuildSketch(Plane(origin=(0, 22, 0), x_dir=(1, 0, 0), z_dir=(0, 1, 0))):
        with Locations(Location((0, 0, 0), (0, 0, 270))):
            Circle(SKETCH7_R)
        with Locations(Location((0, 0, 0), (0, 0, 270))):
            Circle(SKETCH7_R_2, mode=Mode.SUBTRACT)
    extrude(amount=BOSS_EXTRUDE3_DEPTH)

    # Chamfer1
    # the kernel refuses this chamfer: 2.5 mm, written as the material it adds along each edge
    with BuildSketch(Plane(origin=(23.69, 0, -11), x_dir=(0.9912092295509807, 0, 0.13230367815352426), z_dir=(0, 1, 0))) as chamfer1_piece_1_section:
        with BuildLine():
            Line((2.910680919, 0), (-CHAMFER1_SIZE * 0.132303678154, CHAMFER1_SIZE * 0.991209229551))
            Line((-CHAMFER1_SIZE * 0.132303678154, CHAMFER1_SIZE * 0.991209229551), (0, 0))
            ThreePointArc((0, 0), (1.49552658, 0.096625069), (2.910680919, 0))
        make_face()
    chamfer1_piece_1 = extrude(amount=7, mode=Mode.PRIVATE)
    chamfer1_piece_1 = split(chamfer1_piece_1, bisect_by=Plane(origin=(23.69, 0, -13.5), z_dir=(0, 0, 1)), keep=Keep.TOP, mode=Mode.PRIVATE)
    add(chamfer1_piece_1)

    # Sketch8 → Cut-Extrude4 (cut)
    with BuildSketch(Plane(origin=(0, 0, 0), x_dir=(1, 0, 0), z_dir=(0, 1, 0))):
        Polygon((-31.113, -12.25), (-31.113, 0), (-31.113, 12.25), (-31.113, 13.5), (-51.113, 13.5), (-51.113, -13.5), (-31.113, -13.5), align=None)
        Polygon((-31.113, 12.25), (-31.113, 0), (-31.113, -12.25), (-13.613, -6.5), (-13.613, 6.5), align=None)
    extrude(amount=CUT_EXTRUDE4_DEPTH, mode=Mode.SUBTRACT)

    # Sketch9 → Cut-Extrude5 (cut, two sides: drawn at the far end of the back side and taken through both)
    with BuildSketch(Plane(origin=(0, 0, 0), x_dir=(1, 0, 0), z_dir=(0, 1, 0)).offset(-CUT_EXTRUDE5_DEPTH_BACK)):
        with Locations(Location((12, 9, 0), (0, 0, 90))):
            Circle(SKETCH9_R)
        with Locations(Location((12, -9, 0), (0, 0, 90))):
            Circle(SKETCH9_R)
        with Locations(Location((-12, -9, 0), (0, 0, 90))):
            Circle(SKETCH9_R)
        with Locations(Location((-12, 9, 0), (0, 0, 90))):
            Circle(SKETCH9_R)
    extrude(amount=CUT_EXTRUDE5_DEPTH + CUT_EXTRUDE5_DEPTH_BACK, mode=Mode.SUBTRACT)

    # Sketch10 → Cut-Extrude6 (cut)
    # profile 1 of 4: a face of its own
    with BuildSketch(Plane(origin=(0, 7, 0), x_dir=(1, 0, 0), z_dir=(0, 1, 0)).offset(CUT_EXTRUDE6_START)):
        Polygon((-15.175426481, -9), (-13.58771324, -11.75), (-10.41228676, -11.75), (-8.824573519, -9), (-10.41228676, -6.25), (-13.58771324, -6.25), align=None)
        with Locations(Location((-12, -9, 0), (0, 0, 90))):
            Circle(SKETCH10_R, mode=Mode.SUBTRACT)
    # profile 2 of 4: a face of its own
    with BuildSketch(Plane(origin=(0, 7, 0), x_dir=(1, 0, 0), z_dir=(0, 1, 0)).offset(CUT_EXTRUDE6_START)):
        Polygon((-15.175426481, 9), (-13.58771324, 6.25), (-10.41228676, 6.25), (-8.824573519, 9), (-10.41228676, 11.75), (-13.58771324, 11.75), align=None)
        with Locations(Location((-12, 9, 0), (0, 0, 90))):
            Circle(SKETCH10_R, mode=Mode.SUBTRACT)
    # profile 3 of 4: a face of its own
    with BuildSketch(Plane(origin=(0, 7, 0), x_dir=(1, 0, 0), z_dir=(0, 1, 0)).offset(CUT_EXTRUDE6_START)):
        Polygon((15.175426481, 9), (13.58771324, 11.75), (10.41228676, 11.75), (8.824573519, 9), (10.41228676, 6.25), (13.58771324, 6.25), align=None)
        with Locations(Location((12, 9, 0), (0, 0, 90))):
            Circle(SKETCH10_R, mode=Mode.SUBTRACT)
    # profile 4 of 4: a face of its own
    with BuildSketch(Plane(origin=(0, 7, 0), x_dir=(1, 0, 0), z_dir=(0, 1, 0)).offset(CUT_EXTRUDE6_START)):
        Polygon((15.175426481, -9), (13.58771324, -6.25), (10.41228676, -6.25), (8.824573519, -9), (10.41228676, -11.75), (13.58771324, -11.75), align=None)
        with Locations(Location((12, -9, 0), (0, 0, 90))):
            Circle(SKETCH10_R, mode=Mode.SUBTRACT)
    extrude(amount=CUT_EXTRUDE6_DEPTH, mode=Mode.SUBTRACT)

    # Chamfer2
    # the kernel refuses this chamfer: 5 mm, written as the material it adds along each edge
    with BuildSketch(Plane(origin=(23.69, 0, 11), x_dir=(0.9874000606639179, 0, -0.15824386307497393), z_dir=(0, 1, 0))) as chamfer2_piece_1:
        with BuildLine():
            Line((3.622786344, 0.141421356), (-0.805837357, -4.287202344))
            Line((-0.805837357, -4.287202344), (-0.904577363, -4.271377958))
            ThreePointArc((-0.904577363, -4.271377958), (-0.443767224, -2.137054655), (-0.098740006, 0.015824386))
            Line((-0.098740006, 0.015824386), (0.015824386, 0.098740006))
            ThreePointArc((0.015824386, 0.098740006), (1.81210794, -0.038365312), (3.606961958, 0.240161362))
            Line((3.606961958, 0.240161362), (3.622786344, 0.141421356))
        make_face()
    extrude(amount=7)

    # Chamfer3
    chamfer3_edges = [part.edges().sort_by_distance(p)[0] for p in [
        (-31.113, 3.5, 43.5),
    ]]
    chamfer3_side = [part.faces().sort_by_distance(p)[0] for p in [
        (-31.113, 3.470588235, 28.316176471),
    ]]
    chamfer(chamfer3_edges, length=CHAMFER3_SIZE, length2=CHAMFER3_SIZE2, reference=chamfer3_side[0])

    # Chamfer4
    chamfer4_edges = [part.edges().sort_by_distance(p)[0] for p in [
        (23.69, 3.5, 43.5),
    ]]
    chamfer(chamfer4_edges, length=CHAMFER4_SIZE)

    # Fillet1
    fillet1_edges = [part.edges().sort_by_distance(p)[0] for p in [
        (-31.113, 4.5, 13.5),
    ]]
    fillet(fillet1_edges, radius=FILLET1_R)

    # Sketch14 → Cut-Extrude8 (cut)
    with BuildSketch(Plane.XZ):
        with Locations(Location((0, 26.87, 0), (0, 0, 270))):
            Circle(SKETCH14_R)
        with Locations(Location((0, 26.87, 0), (0, 0, 270))):
            Circle(SKETCH14_R_2, mode=Mode.SUBTRACT)
        with Locations(Location((5.5, 32.37, 0), (0, 0, 270))):
            Circle(SKETCH14_R_3, mode=Mode.SUBTRACT)
        with Locations(Location((-5.5, 21.37, 0), (0, 0, 270))):
            Circle(SKETCH14_R_3, mode=Mode.SUBTRACT)
        with Locations(Location((-5.5, 32.37, 0), (0, 0, 270))):
            Circle(SKETCH14_R_3, mode=Mode.SUBTRACT)
        with Locations(Location((5.5, 21.37, 0), (0, 0, 270))):
            Circle(SKETCH14_R_3, mode=Mode.SUBTRACT)
    extrude(amount=-CUT_EXTRUDE8_DEPTH, mode=Mode.SUBTRACT)

    # Fillet2
    # the kernel refuses this fillet: 3 mm, written as the material it takes off along each edge
    with BuildSketch(Plane(origin=(-31.113, -5.001031038, -12.25), x_dir=(0.9500317490404903, 0, 0.3121532889704462), z_dir=(0, 1, 0))) as fillet2_piece_1:
        with BuildLine():
            CenterArc((2.000412415, 3), FILLET2_R, 217.167948486, 52.832051514)
            Line((-0.390191611, 1.187539686), (-0.438003692, 1.15129048))
            ThreePointArc((-0.438003692, 1.15129048), (-0.252097711, 0.575040646), (-0.057001905, -0.018729197))
            Line((-0.057001905, -0.018729197), (0, -0.06))
            Line((0, -0.06), (2.000412415, -0.06))
            Line((2.000412415, -0.06), (2.000412415, 0))
        make_face()
    extrude(amount=7.001031038, mode=Mode.SUBTRACT)
    with BuildSketch(Plane(origin=(-31.113, -5.001031038, 12.25), x_dir=(0, 0, 1), z_dir=(0, 1, 0))) as fillet2_piece_2:
        with BuildLine():
            CenterArc((2.225659932, 2.836915173), FILLET2_R, 198.1890457, 52.832051514)
            Line((-0.624435315, 1.900455306), (-0.68143722, 1.881726108))
            Line((-0.68143722, 1.881726108), (-0.057001905, -0.018729197))
            Line((-0.057001905, -0.018729197), (0, -0.06))
            ThreePointArc((0, -0.06), (0.625, -0.06), (1.230486801, -0.056738303))
            Line((1.230486801, -0.056738303), (1.25, 0))
        make_face()
    extrude(amount=7.001031038, mode=Mode.SUBTRACT)


solid = part.part
